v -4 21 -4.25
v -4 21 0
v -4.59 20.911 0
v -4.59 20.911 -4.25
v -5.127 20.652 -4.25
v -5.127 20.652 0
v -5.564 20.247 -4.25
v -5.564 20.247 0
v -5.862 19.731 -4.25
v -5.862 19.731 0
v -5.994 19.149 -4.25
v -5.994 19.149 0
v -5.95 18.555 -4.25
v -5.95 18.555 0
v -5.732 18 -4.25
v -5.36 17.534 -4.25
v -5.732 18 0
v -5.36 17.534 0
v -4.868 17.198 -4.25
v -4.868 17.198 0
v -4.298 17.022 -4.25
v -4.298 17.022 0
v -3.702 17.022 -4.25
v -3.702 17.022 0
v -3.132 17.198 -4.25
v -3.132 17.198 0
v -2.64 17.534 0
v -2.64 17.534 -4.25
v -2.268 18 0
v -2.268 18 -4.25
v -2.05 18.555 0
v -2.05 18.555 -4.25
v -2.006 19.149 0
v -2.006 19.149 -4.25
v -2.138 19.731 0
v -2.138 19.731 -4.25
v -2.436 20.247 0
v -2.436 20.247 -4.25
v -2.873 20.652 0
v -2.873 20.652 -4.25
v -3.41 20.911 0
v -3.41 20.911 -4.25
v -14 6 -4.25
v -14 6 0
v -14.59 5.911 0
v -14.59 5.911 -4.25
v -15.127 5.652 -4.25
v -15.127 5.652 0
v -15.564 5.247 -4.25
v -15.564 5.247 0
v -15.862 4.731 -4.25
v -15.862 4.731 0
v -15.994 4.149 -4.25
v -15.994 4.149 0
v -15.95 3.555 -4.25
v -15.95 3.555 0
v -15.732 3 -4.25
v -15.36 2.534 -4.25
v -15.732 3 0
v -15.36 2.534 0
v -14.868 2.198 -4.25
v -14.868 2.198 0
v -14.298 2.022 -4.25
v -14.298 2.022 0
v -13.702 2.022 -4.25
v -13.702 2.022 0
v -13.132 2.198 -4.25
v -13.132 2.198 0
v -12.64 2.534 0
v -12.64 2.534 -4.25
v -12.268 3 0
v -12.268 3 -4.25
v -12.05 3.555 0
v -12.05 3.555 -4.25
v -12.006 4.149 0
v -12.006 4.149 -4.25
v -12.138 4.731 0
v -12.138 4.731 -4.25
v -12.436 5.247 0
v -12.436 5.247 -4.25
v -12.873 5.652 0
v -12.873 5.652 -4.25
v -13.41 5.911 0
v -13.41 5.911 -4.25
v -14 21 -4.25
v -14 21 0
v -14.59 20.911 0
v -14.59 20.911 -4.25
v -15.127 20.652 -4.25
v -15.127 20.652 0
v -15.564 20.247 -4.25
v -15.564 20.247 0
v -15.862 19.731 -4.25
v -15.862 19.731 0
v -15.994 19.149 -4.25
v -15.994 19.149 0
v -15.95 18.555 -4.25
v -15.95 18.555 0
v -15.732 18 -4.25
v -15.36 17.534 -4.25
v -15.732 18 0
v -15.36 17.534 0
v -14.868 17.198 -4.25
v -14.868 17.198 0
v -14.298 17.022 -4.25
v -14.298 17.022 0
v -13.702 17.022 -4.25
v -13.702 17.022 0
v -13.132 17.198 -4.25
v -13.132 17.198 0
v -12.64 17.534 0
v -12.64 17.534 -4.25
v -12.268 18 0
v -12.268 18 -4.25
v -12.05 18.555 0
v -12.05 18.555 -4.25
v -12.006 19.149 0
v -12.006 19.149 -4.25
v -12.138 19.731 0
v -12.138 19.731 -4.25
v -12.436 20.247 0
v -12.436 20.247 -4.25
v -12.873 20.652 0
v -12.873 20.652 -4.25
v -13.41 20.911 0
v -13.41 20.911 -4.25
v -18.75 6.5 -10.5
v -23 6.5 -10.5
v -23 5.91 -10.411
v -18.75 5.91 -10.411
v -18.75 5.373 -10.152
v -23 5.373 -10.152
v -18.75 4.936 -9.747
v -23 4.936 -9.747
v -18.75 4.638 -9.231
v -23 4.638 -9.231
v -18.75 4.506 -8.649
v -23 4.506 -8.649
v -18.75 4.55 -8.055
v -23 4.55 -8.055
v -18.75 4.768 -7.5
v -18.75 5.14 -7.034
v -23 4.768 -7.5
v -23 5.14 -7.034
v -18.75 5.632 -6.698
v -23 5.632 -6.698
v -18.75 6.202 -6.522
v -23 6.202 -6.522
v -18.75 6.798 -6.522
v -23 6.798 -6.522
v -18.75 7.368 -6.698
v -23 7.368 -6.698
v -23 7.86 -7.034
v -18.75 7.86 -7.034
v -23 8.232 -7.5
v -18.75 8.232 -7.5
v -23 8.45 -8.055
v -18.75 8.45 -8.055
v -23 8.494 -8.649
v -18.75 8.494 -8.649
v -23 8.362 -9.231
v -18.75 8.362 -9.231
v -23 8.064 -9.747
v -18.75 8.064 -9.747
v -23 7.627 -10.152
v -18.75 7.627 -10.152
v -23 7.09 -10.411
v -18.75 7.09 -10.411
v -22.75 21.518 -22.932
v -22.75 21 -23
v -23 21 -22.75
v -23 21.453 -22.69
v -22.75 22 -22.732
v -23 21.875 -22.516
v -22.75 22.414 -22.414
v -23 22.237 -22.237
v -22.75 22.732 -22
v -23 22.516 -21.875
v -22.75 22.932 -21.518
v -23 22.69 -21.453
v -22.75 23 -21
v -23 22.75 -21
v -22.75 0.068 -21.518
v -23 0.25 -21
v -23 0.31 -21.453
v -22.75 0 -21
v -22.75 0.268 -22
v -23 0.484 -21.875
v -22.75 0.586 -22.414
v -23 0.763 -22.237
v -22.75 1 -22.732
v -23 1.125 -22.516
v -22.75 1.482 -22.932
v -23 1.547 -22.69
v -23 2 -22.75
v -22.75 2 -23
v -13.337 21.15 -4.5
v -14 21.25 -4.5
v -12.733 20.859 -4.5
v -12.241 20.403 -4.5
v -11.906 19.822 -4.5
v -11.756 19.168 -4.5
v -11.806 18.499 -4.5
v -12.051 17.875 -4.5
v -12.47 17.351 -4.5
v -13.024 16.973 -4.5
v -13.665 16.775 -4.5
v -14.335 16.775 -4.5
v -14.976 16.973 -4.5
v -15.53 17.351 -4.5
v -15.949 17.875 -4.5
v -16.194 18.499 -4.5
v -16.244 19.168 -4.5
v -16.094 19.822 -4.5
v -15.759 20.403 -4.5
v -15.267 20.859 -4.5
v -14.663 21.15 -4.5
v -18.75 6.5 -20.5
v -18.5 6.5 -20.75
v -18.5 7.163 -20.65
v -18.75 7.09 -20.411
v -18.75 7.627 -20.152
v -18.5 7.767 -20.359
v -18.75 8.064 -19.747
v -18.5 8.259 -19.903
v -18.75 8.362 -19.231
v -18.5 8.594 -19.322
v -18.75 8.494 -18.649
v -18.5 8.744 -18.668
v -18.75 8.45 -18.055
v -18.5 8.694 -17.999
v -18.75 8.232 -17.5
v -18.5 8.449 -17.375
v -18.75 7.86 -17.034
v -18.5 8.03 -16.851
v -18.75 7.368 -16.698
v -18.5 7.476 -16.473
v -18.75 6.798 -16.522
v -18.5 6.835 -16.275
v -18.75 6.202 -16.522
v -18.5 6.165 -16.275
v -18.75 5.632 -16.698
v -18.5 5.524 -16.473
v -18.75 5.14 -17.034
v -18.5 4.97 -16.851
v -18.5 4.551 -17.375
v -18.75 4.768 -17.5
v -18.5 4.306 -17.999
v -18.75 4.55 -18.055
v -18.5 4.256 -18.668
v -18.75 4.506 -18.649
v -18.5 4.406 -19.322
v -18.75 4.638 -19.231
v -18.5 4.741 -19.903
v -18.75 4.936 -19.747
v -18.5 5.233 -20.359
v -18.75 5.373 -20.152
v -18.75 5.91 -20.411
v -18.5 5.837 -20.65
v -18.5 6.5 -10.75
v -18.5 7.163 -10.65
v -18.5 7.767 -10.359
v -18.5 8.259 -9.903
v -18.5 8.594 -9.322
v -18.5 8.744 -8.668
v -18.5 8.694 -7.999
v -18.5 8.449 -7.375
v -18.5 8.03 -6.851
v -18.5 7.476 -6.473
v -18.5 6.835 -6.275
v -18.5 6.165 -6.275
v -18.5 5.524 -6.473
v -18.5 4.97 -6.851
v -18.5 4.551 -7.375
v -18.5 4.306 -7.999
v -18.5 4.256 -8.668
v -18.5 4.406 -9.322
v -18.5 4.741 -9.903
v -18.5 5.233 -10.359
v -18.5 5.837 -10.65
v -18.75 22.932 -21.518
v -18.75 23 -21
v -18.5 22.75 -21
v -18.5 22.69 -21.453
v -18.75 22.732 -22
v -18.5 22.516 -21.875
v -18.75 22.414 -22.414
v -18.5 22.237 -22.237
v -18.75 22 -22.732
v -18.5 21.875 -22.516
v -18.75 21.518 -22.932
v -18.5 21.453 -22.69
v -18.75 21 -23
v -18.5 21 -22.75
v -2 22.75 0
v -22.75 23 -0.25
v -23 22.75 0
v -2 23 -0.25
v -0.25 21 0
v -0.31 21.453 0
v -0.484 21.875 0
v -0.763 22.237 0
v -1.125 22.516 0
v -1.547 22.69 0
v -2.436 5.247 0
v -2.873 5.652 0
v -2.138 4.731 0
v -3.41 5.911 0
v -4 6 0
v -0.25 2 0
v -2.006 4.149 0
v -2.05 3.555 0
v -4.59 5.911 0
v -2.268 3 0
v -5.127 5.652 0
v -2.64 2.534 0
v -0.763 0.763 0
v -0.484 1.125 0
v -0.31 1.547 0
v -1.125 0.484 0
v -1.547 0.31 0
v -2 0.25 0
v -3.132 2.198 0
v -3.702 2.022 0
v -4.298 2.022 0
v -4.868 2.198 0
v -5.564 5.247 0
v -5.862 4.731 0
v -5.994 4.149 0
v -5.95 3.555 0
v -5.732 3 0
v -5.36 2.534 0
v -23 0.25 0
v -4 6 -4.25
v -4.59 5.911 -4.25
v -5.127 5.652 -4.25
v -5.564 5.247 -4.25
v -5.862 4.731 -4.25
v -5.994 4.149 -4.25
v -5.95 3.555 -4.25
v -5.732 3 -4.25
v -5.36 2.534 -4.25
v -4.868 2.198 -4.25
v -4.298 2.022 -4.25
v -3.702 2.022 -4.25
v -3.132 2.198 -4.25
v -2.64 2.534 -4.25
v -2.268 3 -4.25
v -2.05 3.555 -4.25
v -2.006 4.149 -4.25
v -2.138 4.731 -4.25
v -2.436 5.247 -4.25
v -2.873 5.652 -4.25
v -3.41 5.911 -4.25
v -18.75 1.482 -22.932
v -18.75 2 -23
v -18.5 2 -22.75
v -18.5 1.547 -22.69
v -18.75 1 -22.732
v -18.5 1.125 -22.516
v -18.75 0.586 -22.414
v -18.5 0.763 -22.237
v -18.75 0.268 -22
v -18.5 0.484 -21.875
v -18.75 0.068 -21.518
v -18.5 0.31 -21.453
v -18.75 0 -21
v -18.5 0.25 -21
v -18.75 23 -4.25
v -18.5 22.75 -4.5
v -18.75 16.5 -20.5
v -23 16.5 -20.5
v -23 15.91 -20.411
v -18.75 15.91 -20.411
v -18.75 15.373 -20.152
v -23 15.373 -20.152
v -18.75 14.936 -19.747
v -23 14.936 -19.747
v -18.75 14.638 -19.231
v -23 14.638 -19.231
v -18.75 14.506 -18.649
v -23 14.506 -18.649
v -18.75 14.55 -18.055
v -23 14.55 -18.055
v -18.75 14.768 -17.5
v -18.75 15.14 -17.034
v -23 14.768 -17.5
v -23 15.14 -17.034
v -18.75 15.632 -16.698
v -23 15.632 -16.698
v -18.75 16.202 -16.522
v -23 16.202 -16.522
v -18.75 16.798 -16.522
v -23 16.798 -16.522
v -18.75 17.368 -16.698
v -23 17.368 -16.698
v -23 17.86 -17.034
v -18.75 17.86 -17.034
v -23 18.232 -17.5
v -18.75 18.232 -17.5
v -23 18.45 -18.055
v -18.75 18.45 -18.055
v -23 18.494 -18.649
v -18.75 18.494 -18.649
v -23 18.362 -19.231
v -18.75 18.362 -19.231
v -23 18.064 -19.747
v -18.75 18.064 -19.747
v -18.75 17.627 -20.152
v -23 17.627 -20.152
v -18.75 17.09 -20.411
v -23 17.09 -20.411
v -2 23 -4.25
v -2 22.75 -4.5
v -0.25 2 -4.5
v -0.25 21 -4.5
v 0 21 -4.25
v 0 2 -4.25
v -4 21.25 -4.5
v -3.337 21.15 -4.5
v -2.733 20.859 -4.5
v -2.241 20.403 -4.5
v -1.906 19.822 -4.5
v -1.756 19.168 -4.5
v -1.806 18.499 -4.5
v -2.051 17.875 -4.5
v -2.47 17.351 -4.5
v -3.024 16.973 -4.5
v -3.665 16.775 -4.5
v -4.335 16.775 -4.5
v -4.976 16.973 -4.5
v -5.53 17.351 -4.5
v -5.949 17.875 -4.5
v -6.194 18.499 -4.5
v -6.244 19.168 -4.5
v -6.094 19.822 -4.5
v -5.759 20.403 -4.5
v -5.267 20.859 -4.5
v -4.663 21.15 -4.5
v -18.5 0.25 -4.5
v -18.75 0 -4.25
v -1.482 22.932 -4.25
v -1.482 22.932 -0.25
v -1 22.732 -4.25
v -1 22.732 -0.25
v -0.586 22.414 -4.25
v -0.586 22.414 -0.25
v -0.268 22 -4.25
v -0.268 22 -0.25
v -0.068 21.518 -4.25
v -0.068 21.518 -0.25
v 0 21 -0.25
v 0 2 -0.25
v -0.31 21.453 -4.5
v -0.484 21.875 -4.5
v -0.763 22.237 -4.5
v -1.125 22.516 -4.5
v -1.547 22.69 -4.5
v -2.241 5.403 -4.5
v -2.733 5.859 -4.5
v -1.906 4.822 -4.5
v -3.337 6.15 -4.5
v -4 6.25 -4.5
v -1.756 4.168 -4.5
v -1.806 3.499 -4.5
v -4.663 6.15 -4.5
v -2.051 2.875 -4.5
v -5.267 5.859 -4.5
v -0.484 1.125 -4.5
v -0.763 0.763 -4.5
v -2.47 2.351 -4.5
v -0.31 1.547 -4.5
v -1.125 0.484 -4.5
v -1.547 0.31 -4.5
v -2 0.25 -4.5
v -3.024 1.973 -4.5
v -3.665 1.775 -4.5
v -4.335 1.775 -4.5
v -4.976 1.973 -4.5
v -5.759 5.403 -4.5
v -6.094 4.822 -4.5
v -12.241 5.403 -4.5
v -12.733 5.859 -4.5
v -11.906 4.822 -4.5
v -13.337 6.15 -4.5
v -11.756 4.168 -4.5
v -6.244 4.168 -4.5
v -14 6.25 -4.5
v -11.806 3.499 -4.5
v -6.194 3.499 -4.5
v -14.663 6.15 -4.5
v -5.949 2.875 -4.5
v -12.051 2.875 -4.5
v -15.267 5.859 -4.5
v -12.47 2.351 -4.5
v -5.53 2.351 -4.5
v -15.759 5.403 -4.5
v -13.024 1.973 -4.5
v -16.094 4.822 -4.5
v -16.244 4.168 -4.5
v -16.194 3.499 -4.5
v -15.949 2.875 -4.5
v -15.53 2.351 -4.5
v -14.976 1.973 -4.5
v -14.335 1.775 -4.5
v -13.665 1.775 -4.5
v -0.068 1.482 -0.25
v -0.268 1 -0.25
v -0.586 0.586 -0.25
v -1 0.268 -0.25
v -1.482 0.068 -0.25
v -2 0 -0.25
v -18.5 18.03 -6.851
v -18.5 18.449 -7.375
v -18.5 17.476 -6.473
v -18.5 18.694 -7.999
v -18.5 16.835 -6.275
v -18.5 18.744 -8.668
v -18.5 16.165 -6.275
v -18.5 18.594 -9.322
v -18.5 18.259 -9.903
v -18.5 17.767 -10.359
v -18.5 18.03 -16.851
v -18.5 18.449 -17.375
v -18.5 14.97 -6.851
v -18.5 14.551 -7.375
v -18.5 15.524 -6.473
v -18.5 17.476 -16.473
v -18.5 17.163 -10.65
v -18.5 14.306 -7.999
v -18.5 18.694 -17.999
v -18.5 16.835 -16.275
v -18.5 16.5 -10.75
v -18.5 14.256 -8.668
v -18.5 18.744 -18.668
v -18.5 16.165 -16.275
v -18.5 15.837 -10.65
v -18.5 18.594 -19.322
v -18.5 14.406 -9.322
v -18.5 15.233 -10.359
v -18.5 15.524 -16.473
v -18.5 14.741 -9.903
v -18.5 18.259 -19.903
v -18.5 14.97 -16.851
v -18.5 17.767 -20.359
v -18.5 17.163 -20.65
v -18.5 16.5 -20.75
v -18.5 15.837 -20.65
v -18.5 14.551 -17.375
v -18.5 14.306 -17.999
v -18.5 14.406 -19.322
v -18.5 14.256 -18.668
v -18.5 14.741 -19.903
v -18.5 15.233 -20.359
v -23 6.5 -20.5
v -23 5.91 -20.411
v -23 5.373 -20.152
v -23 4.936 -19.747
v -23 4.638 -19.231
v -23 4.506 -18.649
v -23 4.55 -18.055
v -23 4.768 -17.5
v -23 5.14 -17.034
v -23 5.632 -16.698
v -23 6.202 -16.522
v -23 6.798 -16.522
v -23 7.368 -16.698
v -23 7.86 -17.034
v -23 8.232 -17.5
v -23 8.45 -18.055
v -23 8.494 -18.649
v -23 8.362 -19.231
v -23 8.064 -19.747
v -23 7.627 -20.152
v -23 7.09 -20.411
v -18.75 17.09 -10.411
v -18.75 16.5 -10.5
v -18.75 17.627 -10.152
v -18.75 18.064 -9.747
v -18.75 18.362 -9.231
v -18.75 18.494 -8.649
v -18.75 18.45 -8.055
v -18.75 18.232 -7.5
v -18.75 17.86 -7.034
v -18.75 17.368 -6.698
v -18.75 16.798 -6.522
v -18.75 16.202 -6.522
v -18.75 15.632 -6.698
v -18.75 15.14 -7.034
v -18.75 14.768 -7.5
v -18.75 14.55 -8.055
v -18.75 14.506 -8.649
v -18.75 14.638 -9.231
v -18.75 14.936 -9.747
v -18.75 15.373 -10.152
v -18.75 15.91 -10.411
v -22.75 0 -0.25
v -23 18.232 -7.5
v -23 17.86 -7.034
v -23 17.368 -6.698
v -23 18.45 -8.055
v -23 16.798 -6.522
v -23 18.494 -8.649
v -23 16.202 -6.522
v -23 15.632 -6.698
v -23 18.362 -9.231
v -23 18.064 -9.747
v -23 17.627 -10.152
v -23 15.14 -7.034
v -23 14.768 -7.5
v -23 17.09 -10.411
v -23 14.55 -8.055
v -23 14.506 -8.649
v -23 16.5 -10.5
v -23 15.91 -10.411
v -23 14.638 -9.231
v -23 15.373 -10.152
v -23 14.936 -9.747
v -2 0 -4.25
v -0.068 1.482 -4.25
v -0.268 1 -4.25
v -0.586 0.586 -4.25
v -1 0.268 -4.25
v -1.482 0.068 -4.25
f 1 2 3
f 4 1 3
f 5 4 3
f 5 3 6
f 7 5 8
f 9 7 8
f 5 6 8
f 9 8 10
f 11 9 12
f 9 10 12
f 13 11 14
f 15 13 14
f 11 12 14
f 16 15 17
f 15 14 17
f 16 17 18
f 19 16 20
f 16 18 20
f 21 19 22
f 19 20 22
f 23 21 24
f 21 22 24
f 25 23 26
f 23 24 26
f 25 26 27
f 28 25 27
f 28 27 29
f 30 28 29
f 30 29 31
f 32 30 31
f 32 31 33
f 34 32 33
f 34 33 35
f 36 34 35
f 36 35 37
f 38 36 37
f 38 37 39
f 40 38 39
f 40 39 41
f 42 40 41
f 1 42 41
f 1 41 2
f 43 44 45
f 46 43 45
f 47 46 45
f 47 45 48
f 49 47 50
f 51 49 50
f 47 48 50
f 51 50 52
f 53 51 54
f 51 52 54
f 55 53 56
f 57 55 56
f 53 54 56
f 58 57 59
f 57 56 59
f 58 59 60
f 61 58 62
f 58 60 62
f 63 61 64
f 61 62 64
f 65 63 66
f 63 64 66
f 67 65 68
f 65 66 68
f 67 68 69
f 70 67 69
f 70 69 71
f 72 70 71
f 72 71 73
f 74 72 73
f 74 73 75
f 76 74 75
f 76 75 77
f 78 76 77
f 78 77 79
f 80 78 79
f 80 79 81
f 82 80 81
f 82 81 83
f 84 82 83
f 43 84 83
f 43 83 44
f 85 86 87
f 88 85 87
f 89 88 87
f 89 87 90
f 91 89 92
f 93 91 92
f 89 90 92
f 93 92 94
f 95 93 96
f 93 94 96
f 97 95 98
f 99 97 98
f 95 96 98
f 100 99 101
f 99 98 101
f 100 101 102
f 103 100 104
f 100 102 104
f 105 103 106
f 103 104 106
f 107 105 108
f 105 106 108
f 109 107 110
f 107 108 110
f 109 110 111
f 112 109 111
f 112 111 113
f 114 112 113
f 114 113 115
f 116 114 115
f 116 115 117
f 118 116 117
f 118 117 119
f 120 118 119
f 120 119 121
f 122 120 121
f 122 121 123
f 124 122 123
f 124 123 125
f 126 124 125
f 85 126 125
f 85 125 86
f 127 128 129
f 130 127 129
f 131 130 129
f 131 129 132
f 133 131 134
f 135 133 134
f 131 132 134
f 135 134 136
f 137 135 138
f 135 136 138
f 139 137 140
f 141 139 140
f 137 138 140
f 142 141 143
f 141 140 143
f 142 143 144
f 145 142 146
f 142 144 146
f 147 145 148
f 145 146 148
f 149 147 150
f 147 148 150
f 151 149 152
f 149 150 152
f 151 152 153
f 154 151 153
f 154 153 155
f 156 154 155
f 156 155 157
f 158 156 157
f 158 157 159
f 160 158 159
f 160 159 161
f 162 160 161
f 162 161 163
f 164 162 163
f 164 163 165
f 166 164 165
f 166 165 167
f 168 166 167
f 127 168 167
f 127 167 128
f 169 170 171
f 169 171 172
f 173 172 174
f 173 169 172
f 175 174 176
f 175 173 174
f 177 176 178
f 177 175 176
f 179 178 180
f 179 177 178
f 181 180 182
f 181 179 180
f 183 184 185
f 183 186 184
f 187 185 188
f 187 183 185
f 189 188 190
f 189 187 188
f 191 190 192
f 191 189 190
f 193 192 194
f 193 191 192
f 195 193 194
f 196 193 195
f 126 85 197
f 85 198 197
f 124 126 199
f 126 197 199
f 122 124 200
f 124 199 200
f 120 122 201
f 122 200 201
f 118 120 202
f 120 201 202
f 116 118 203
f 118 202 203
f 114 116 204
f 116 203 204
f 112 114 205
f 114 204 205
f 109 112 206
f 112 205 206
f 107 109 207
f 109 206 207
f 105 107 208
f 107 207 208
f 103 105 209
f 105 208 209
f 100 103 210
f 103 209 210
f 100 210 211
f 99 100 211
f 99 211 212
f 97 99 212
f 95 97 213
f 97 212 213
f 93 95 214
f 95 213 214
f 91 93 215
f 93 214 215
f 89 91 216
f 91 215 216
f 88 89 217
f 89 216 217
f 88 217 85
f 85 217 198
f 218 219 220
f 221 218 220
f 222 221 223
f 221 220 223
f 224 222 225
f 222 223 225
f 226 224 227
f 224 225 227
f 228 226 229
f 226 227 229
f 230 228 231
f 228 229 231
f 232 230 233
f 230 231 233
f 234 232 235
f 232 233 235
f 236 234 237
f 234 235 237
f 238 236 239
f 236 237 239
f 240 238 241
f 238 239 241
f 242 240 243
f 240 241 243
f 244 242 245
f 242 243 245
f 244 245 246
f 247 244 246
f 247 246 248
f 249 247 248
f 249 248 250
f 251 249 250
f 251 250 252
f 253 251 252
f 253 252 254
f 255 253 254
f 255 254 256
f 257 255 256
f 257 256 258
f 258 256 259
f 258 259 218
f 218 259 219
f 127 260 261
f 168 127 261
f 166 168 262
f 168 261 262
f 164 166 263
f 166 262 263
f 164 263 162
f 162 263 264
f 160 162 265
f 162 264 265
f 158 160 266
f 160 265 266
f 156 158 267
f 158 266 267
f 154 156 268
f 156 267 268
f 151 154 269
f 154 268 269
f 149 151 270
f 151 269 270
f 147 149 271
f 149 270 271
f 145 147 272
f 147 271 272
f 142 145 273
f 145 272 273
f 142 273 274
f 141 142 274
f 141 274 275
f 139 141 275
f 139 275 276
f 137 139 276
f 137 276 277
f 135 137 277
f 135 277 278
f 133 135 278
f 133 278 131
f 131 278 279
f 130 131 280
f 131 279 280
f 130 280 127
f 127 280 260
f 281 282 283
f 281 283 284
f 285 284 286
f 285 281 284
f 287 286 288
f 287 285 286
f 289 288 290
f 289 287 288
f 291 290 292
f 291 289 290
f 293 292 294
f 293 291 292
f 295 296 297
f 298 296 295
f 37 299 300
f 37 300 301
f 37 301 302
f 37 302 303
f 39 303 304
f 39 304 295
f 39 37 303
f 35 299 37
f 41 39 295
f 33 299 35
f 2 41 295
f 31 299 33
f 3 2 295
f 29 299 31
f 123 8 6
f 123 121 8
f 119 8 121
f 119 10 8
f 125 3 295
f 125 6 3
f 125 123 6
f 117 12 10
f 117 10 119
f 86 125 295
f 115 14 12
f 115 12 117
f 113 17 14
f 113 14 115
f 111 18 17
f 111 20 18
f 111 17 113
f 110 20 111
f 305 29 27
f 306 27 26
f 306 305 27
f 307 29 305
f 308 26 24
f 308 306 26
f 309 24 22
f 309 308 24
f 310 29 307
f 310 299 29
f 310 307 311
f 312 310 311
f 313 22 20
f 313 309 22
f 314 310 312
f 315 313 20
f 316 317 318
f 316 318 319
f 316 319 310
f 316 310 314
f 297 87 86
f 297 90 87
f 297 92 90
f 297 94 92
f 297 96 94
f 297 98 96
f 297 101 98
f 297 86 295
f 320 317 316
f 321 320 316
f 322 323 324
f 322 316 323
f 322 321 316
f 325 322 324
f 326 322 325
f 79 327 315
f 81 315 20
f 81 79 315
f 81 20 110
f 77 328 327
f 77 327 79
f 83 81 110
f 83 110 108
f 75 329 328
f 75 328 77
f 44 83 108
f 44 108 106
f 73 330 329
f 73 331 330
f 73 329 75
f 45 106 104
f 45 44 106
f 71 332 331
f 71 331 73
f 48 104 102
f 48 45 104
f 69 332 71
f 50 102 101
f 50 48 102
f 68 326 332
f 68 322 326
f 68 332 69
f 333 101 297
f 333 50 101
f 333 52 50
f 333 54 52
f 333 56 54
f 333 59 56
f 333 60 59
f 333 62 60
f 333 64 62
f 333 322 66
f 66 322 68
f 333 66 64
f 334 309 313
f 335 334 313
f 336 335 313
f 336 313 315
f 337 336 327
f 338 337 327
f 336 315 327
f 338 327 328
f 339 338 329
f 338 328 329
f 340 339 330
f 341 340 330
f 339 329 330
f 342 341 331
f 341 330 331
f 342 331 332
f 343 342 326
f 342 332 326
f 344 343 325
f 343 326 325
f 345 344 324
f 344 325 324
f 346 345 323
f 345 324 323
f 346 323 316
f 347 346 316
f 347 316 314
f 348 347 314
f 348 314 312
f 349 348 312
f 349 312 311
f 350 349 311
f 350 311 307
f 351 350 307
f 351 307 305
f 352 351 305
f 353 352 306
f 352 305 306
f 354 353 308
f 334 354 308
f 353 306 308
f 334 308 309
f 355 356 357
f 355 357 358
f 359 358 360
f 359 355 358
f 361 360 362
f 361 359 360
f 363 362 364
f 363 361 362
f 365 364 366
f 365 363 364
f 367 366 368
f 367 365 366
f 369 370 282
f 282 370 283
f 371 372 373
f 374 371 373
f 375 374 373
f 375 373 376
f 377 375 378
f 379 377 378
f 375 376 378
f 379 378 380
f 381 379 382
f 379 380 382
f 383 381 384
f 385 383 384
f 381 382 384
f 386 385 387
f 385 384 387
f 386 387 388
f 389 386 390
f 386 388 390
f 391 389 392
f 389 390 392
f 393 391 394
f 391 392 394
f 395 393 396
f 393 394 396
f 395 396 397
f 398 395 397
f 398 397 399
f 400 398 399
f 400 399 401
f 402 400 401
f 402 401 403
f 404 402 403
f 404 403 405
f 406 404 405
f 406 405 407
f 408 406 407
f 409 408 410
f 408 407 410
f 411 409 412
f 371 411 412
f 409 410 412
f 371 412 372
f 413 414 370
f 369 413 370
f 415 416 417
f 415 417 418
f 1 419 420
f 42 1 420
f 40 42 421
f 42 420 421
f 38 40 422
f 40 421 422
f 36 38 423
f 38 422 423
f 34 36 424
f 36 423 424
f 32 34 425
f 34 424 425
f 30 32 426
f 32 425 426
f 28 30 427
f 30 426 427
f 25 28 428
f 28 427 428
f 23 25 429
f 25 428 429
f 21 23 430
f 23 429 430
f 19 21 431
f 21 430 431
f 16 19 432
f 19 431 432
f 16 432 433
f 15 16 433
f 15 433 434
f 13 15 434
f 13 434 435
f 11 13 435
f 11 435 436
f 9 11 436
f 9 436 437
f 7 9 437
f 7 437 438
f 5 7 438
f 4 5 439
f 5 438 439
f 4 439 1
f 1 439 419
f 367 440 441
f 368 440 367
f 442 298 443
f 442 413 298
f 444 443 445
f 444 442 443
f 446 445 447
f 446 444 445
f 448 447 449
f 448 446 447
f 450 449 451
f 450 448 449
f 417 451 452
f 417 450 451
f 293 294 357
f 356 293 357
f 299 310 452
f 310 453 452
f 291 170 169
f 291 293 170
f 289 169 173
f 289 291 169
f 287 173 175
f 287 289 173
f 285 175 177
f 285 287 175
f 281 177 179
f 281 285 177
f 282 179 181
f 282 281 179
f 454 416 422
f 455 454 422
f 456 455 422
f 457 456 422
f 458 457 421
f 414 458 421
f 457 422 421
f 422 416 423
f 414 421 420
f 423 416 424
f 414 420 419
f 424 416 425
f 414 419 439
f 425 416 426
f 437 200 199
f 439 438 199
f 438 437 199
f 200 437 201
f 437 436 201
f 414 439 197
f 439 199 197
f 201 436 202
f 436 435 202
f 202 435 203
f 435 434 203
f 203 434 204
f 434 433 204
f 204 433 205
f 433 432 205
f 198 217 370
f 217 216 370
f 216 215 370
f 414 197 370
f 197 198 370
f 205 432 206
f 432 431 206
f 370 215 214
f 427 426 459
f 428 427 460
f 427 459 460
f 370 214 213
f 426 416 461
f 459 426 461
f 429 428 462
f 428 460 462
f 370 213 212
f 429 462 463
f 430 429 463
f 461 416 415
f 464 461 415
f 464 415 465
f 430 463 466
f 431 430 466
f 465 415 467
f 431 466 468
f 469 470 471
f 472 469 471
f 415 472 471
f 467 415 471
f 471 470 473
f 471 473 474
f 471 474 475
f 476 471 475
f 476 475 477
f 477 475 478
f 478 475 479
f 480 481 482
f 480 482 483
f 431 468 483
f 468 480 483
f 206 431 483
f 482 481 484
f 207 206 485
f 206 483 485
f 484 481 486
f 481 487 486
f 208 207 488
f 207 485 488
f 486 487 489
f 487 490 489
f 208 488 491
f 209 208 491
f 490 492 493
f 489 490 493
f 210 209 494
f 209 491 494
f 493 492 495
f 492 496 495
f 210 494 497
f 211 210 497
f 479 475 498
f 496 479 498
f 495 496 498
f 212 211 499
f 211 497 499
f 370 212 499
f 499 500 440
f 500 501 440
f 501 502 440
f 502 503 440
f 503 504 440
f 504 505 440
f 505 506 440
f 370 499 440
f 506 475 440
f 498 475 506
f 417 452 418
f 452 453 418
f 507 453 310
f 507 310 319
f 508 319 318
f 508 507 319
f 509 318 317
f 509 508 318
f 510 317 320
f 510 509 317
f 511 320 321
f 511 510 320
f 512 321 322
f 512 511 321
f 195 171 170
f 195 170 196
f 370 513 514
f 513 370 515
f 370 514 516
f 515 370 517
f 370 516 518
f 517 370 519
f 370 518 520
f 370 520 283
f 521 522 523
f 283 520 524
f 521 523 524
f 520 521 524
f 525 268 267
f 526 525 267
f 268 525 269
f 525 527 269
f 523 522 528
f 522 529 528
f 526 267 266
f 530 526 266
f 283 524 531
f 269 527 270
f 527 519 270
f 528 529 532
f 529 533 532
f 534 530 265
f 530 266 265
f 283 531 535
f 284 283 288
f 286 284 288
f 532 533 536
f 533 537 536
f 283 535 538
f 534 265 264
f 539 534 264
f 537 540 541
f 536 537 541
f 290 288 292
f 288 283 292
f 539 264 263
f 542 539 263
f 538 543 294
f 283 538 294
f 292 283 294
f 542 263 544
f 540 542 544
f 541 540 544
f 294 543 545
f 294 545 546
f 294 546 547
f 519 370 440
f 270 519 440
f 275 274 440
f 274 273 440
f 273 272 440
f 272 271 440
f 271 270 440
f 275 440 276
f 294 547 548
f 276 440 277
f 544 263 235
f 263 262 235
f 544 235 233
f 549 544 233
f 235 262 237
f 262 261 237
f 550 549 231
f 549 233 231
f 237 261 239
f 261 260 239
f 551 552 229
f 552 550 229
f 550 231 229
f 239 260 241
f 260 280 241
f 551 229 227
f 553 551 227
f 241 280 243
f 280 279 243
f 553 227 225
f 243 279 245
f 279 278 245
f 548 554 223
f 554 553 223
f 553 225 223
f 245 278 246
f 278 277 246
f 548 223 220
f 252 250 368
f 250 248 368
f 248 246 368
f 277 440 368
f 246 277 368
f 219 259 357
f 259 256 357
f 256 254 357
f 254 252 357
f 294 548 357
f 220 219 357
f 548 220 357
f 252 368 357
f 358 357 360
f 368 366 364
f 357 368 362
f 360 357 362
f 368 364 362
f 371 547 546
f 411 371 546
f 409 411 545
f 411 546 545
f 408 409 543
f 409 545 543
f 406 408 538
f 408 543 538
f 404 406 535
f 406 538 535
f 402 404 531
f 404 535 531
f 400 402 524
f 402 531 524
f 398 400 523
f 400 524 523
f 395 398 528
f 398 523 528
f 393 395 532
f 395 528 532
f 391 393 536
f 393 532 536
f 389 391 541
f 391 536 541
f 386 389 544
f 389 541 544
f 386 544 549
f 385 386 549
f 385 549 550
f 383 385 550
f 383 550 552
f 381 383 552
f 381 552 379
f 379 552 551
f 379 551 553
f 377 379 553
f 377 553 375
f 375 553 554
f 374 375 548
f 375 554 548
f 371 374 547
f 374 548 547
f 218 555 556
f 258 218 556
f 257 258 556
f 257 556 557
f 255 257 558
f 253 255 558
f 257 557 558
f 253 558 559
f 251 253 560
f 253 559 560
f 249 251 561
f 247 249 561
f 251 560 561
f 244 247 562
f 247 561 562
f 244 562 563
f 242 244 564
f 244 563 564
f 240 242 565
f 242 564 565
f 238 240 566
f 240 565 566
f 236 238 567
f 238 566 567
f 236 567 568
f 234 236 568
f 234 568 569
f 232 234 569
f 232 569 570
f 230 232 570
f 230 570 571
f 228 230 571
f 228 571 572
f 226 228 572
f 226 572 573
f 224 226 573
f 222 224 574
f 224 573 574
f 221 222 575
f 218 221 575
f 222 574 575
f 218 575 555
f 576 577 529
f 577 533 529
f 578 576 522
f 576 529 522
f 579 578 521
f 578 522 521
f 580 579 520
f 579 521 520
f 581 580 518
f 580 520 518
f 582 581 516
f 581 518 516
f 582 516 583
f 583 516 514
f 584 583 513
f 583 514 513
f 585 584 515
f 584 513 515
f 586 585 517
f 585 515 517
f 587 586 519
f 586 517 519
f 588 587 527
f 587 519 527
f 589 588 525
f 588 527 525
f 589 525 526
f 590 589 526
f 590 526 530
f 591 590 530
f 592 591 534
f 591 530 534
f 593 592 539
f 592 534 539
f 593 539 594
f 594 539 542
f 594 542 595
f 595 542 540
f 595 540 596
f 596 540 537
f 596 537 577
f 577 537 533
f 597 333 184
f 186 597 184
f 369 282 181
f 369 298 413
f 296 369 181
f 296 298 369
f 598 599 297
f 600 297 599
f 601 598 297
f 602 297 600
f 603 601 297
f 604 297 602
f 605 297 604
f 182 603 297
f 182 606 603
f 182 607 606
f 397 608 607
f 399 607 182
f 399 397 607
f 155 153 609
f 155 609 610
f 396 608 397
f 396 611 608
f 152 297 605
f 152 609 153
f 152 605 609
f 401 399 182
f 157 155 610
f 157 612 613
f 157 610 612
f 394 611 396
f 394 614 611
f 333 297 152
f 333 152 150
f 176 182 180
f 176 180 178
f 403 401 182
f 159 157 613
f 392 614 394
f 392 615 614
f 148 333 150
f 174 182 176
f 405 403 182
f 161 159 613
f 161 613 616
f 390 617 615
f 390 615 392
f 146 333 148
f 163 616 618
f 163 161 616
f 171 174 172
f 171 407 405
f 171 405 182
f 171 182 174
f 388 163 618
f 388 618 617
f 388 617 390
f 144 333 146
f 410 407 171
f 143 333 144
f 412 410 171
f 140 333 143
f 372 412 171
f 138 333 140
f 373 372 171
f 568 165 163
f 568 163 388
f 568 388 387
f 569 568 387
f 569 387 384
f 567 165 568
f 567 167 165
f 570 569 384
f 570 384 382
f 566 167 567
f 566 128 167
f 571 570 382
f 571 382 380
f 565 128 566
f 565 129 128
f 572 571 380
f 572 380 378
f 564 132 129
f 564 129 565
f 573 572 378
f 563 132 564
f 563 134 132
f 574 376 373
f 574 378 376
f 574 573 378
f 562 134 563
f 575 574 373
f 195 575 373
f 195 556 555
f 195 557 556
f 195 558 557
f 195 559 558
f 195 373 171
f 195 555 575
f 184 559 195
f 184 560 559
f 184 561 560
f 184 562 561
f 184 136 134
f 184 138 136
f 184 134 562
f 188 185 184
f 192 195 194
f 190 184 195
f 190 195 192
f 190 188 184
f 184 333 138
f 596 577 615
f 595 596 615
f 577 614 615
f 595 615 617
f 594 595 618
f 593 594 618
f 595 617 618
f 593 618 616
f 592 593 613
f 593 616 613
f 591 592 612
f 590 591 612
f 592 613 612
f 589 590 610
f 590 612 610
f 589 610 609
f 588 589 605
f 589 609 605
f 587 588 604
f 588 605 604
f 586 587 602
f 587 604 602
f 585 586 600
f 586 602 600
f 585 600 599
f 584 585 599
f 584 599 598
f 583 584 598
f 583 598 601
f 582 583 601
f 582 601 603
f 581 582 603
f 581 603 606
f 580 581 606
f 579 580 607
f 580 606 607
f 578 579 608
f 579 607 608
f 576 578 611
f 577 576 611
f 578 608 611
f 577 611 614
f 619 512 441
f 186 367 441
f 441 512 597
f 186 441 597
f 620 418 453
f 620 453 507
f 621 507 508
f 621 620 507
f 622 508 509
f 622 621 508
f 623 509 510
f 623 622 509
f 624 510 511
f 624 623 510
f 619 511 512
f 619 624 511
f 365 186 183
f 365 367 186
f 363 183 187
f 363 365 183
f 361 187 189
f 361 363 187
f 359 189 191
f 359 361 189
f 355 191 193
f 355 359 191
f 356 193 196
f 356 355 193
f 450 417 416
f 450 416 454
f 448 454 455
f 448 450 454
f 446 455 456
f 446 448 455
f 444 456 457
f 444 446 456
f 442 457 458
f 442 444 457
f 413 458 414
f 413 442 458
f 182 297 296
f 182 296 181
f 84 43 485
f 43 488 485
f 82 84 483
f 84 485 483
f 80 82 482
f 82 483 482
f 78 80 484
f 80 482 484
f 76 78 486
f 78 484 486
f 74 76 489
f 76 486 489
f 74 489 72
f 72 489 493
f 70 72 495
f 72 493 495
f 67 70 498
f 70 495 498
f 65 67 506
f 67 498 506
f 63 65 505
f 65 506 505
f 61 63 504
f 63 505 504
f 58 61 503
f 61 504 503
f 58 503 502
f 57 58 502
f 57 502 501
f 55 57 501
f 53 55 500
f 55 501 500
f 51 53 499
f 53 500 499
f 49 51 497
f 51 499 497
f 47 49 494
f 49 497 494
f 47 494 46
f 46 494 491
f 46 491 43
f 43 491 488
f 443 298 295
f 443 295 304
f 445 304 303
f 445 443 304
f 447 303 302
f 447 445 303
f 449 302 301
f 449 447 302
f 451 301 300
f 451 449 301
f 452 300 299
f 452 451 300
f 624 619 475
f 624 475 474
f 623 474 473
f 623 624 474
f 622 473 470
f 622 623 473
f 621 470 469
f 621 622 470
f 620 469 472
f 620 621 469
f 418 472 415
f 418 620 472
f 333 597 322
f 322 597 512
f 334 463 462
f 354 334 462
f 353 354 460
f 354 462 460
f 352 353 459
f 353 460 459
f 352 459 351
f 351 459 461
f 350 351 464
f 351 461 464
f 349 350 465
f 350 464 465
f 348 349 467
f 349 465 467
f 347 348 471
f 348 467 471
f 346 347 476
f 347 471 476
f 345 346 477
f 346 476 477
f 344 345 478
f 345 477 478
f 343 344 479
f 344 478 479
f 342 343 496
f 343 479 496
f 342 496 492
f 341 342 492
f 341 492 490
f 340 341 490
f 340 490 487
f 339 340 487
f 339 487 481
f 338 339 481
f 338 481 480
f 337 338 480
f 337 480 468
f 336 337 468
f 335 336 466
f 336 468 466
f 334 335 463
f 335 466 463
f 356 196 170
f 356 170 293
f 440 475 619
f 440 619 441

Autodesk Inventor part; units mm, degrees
ref_plane "YZ Plane" through (0, 0, 0) normal (1, 0, 0) x (0, 1, 0)
ref_plane "XZ Plane" through (0, 0, 0) normal (0, 1, 0) x (-1, 0, 0)
ref_plane "XY Plane" through (0, 0, 0) normal (0, 0, 1) x (1, 0, 0)
sketch "Sketch1" plane through (0, 0, 0) normal (0, 1, 0) x (-1, 0, 0)
  line L0 (0, 0) -> (0, -4.5)
  line L1 (0, 0) -> (23, 0)
  line L2 (23, 0) -> (23, -23)
  line L3 (23, -23) -> (18.5, -23)
  line L4 (0, -4.5) -> (18.5, -4.5)
  line L5 (18.5, -4.5) -> (18.5, -23)
  dimension "d0" = 4.5
  dimension "d1" = 23
  dimension "d2" = 23
  dimension "d3" = 4.5
extrude "Extrusion1" add sketch "Sketch1" along normal blind 23
fillet "Fillet1" radius 2 4 edges at (-20.75, 23, -23) (-20.75, 0, -23) (0, 0, -2.25) (0, 23, -2.25)
sketch "Sketch2" plane through (-18.5, 0, -4.5) normal (0, 0, -1) x (-1, 0, 0)
  circle A0 centre (-14.5, 19) radius 2
  circle A1 centre (-4.5, 19) radius 2
  circle A2 centre (-4.5, 4) radius 2
  circle A3 centre (-14.5, 4) radius 2
  line L0 (-16.5, 23) -> (0, 23) projected
  line L1 (-16.5, 0) -> (0, 0) projected
  line L2 (-18.5, 2) -> (-18.5, 21) projected
  line L3 (4.5, 2) -> (4.5, 21) projected
  point P0 (-18.5, 0)
  dimension "d7" = 4
  dimension "d8" = 4
  dimension "d9" = 4
  dimension "d10" = 4
  dimension "d11" = 4
  dimension "d12" = 15
  dimension "d13" = 4
  dimension "d14" = 4
  dimension "d15" = 10
  dimension "d16" = 4
  dimension "d17" = 4
  dimension "d18" = 9
  dimension "d19" = 9
hole "Hole1" at (-4, 19, -4.5) at (-4, 4, -4.5) at (-14, 19, -4.5) at (-14, 4, -4.5) direction (0, 0, 1) diameter 4 depth 4.5 tip angle 118
sketch "Sketch3" plane through (-18.5, 0, -4.5) normal (1, 0, 0) x (0, 0, -1)
  line L0 (4, 16.5) -> (14, 16.5) construction
  line L1 (14, 16.5) -> (14, 6.5) construction
  line L2 (14, 6.5) -> (4, 6.5) construction
  line L3 (4, 6.5) -> (4, 16.5) construction
  circle A0 centre (4, 16.5) radius 2
  circle A1 centre (14, 16.5) radius 2
  circle A2 centre (14, 6.5) radius 2
  circle A3 centre (4, 6.5) radius 2
  line L4 (0, 23) -> (16.5, 23) projected
  line L5 (-4.5, 2) -> (-4.5, 21) projected
  line L6 (18.5, 2) -> (18.5, 21) projected
  point P0 (-4.5, 0)
  dimension "d27" = 4
  dimension "d28" = 4
  dimension "d29" = 4
  dimension "d30" = 4
  dimension "d31" = 6.5
  dimension "d32" = 10
  dimension "d33" = 10
  dimension "d34" = 8.5
  dimension "d35" = 4.5
hole "Hole2" at (-18.5, 16.5, -8.5) at (-18.5, 16.5, -18.5) at (-18.5, 6.5, -8.5) at (-18.5, 6.5, -18.5) direction (-1, 0, 0) diameter 4 depth 4.5 tip angle 118
chamfer "Chamfer1" distance 0.25 angle 45 28 edges at (-10.25, 23, -4.5) (-0.5858, 22.4142, -4.5) (0, 11.5, -4.5) (-0.5858, 0.5858, -4.5) (-10.25, 0, -4.5) (-12.5, 23, 0) (-0.5858, 22.4142, 0) (0, 11.5, 0) (-0.5858, 0.5858, 0) (-12.5, 0, 0) (-18.5, 23, -12.75) (-18.5, 22.4142, -22.4142) (-18.5, 11.5, -23) (-18.5, 0.5858, -22.4142) (-18.5, 0, -12.75) (-23, 23, -10.5) (-23, 22.4142, -22.4142) (-23, 11.5, -23) (-23, 0.5858, -22.4142) (-23, 0, -10.5) (-18.5, 16.5, -6.5) (-18.5, 16.5, -16.5) (-18.5, 6.5, -6.5) (-18.5, 6.5, -16.5) (-14, 17, -4.5) (-4, 17, -4.5) (-14, 2, -4.5) (-4, 2, -4.5)
properties part number "HUDSON-1-06 FRONT BUFFER BEAM ANGLE"
